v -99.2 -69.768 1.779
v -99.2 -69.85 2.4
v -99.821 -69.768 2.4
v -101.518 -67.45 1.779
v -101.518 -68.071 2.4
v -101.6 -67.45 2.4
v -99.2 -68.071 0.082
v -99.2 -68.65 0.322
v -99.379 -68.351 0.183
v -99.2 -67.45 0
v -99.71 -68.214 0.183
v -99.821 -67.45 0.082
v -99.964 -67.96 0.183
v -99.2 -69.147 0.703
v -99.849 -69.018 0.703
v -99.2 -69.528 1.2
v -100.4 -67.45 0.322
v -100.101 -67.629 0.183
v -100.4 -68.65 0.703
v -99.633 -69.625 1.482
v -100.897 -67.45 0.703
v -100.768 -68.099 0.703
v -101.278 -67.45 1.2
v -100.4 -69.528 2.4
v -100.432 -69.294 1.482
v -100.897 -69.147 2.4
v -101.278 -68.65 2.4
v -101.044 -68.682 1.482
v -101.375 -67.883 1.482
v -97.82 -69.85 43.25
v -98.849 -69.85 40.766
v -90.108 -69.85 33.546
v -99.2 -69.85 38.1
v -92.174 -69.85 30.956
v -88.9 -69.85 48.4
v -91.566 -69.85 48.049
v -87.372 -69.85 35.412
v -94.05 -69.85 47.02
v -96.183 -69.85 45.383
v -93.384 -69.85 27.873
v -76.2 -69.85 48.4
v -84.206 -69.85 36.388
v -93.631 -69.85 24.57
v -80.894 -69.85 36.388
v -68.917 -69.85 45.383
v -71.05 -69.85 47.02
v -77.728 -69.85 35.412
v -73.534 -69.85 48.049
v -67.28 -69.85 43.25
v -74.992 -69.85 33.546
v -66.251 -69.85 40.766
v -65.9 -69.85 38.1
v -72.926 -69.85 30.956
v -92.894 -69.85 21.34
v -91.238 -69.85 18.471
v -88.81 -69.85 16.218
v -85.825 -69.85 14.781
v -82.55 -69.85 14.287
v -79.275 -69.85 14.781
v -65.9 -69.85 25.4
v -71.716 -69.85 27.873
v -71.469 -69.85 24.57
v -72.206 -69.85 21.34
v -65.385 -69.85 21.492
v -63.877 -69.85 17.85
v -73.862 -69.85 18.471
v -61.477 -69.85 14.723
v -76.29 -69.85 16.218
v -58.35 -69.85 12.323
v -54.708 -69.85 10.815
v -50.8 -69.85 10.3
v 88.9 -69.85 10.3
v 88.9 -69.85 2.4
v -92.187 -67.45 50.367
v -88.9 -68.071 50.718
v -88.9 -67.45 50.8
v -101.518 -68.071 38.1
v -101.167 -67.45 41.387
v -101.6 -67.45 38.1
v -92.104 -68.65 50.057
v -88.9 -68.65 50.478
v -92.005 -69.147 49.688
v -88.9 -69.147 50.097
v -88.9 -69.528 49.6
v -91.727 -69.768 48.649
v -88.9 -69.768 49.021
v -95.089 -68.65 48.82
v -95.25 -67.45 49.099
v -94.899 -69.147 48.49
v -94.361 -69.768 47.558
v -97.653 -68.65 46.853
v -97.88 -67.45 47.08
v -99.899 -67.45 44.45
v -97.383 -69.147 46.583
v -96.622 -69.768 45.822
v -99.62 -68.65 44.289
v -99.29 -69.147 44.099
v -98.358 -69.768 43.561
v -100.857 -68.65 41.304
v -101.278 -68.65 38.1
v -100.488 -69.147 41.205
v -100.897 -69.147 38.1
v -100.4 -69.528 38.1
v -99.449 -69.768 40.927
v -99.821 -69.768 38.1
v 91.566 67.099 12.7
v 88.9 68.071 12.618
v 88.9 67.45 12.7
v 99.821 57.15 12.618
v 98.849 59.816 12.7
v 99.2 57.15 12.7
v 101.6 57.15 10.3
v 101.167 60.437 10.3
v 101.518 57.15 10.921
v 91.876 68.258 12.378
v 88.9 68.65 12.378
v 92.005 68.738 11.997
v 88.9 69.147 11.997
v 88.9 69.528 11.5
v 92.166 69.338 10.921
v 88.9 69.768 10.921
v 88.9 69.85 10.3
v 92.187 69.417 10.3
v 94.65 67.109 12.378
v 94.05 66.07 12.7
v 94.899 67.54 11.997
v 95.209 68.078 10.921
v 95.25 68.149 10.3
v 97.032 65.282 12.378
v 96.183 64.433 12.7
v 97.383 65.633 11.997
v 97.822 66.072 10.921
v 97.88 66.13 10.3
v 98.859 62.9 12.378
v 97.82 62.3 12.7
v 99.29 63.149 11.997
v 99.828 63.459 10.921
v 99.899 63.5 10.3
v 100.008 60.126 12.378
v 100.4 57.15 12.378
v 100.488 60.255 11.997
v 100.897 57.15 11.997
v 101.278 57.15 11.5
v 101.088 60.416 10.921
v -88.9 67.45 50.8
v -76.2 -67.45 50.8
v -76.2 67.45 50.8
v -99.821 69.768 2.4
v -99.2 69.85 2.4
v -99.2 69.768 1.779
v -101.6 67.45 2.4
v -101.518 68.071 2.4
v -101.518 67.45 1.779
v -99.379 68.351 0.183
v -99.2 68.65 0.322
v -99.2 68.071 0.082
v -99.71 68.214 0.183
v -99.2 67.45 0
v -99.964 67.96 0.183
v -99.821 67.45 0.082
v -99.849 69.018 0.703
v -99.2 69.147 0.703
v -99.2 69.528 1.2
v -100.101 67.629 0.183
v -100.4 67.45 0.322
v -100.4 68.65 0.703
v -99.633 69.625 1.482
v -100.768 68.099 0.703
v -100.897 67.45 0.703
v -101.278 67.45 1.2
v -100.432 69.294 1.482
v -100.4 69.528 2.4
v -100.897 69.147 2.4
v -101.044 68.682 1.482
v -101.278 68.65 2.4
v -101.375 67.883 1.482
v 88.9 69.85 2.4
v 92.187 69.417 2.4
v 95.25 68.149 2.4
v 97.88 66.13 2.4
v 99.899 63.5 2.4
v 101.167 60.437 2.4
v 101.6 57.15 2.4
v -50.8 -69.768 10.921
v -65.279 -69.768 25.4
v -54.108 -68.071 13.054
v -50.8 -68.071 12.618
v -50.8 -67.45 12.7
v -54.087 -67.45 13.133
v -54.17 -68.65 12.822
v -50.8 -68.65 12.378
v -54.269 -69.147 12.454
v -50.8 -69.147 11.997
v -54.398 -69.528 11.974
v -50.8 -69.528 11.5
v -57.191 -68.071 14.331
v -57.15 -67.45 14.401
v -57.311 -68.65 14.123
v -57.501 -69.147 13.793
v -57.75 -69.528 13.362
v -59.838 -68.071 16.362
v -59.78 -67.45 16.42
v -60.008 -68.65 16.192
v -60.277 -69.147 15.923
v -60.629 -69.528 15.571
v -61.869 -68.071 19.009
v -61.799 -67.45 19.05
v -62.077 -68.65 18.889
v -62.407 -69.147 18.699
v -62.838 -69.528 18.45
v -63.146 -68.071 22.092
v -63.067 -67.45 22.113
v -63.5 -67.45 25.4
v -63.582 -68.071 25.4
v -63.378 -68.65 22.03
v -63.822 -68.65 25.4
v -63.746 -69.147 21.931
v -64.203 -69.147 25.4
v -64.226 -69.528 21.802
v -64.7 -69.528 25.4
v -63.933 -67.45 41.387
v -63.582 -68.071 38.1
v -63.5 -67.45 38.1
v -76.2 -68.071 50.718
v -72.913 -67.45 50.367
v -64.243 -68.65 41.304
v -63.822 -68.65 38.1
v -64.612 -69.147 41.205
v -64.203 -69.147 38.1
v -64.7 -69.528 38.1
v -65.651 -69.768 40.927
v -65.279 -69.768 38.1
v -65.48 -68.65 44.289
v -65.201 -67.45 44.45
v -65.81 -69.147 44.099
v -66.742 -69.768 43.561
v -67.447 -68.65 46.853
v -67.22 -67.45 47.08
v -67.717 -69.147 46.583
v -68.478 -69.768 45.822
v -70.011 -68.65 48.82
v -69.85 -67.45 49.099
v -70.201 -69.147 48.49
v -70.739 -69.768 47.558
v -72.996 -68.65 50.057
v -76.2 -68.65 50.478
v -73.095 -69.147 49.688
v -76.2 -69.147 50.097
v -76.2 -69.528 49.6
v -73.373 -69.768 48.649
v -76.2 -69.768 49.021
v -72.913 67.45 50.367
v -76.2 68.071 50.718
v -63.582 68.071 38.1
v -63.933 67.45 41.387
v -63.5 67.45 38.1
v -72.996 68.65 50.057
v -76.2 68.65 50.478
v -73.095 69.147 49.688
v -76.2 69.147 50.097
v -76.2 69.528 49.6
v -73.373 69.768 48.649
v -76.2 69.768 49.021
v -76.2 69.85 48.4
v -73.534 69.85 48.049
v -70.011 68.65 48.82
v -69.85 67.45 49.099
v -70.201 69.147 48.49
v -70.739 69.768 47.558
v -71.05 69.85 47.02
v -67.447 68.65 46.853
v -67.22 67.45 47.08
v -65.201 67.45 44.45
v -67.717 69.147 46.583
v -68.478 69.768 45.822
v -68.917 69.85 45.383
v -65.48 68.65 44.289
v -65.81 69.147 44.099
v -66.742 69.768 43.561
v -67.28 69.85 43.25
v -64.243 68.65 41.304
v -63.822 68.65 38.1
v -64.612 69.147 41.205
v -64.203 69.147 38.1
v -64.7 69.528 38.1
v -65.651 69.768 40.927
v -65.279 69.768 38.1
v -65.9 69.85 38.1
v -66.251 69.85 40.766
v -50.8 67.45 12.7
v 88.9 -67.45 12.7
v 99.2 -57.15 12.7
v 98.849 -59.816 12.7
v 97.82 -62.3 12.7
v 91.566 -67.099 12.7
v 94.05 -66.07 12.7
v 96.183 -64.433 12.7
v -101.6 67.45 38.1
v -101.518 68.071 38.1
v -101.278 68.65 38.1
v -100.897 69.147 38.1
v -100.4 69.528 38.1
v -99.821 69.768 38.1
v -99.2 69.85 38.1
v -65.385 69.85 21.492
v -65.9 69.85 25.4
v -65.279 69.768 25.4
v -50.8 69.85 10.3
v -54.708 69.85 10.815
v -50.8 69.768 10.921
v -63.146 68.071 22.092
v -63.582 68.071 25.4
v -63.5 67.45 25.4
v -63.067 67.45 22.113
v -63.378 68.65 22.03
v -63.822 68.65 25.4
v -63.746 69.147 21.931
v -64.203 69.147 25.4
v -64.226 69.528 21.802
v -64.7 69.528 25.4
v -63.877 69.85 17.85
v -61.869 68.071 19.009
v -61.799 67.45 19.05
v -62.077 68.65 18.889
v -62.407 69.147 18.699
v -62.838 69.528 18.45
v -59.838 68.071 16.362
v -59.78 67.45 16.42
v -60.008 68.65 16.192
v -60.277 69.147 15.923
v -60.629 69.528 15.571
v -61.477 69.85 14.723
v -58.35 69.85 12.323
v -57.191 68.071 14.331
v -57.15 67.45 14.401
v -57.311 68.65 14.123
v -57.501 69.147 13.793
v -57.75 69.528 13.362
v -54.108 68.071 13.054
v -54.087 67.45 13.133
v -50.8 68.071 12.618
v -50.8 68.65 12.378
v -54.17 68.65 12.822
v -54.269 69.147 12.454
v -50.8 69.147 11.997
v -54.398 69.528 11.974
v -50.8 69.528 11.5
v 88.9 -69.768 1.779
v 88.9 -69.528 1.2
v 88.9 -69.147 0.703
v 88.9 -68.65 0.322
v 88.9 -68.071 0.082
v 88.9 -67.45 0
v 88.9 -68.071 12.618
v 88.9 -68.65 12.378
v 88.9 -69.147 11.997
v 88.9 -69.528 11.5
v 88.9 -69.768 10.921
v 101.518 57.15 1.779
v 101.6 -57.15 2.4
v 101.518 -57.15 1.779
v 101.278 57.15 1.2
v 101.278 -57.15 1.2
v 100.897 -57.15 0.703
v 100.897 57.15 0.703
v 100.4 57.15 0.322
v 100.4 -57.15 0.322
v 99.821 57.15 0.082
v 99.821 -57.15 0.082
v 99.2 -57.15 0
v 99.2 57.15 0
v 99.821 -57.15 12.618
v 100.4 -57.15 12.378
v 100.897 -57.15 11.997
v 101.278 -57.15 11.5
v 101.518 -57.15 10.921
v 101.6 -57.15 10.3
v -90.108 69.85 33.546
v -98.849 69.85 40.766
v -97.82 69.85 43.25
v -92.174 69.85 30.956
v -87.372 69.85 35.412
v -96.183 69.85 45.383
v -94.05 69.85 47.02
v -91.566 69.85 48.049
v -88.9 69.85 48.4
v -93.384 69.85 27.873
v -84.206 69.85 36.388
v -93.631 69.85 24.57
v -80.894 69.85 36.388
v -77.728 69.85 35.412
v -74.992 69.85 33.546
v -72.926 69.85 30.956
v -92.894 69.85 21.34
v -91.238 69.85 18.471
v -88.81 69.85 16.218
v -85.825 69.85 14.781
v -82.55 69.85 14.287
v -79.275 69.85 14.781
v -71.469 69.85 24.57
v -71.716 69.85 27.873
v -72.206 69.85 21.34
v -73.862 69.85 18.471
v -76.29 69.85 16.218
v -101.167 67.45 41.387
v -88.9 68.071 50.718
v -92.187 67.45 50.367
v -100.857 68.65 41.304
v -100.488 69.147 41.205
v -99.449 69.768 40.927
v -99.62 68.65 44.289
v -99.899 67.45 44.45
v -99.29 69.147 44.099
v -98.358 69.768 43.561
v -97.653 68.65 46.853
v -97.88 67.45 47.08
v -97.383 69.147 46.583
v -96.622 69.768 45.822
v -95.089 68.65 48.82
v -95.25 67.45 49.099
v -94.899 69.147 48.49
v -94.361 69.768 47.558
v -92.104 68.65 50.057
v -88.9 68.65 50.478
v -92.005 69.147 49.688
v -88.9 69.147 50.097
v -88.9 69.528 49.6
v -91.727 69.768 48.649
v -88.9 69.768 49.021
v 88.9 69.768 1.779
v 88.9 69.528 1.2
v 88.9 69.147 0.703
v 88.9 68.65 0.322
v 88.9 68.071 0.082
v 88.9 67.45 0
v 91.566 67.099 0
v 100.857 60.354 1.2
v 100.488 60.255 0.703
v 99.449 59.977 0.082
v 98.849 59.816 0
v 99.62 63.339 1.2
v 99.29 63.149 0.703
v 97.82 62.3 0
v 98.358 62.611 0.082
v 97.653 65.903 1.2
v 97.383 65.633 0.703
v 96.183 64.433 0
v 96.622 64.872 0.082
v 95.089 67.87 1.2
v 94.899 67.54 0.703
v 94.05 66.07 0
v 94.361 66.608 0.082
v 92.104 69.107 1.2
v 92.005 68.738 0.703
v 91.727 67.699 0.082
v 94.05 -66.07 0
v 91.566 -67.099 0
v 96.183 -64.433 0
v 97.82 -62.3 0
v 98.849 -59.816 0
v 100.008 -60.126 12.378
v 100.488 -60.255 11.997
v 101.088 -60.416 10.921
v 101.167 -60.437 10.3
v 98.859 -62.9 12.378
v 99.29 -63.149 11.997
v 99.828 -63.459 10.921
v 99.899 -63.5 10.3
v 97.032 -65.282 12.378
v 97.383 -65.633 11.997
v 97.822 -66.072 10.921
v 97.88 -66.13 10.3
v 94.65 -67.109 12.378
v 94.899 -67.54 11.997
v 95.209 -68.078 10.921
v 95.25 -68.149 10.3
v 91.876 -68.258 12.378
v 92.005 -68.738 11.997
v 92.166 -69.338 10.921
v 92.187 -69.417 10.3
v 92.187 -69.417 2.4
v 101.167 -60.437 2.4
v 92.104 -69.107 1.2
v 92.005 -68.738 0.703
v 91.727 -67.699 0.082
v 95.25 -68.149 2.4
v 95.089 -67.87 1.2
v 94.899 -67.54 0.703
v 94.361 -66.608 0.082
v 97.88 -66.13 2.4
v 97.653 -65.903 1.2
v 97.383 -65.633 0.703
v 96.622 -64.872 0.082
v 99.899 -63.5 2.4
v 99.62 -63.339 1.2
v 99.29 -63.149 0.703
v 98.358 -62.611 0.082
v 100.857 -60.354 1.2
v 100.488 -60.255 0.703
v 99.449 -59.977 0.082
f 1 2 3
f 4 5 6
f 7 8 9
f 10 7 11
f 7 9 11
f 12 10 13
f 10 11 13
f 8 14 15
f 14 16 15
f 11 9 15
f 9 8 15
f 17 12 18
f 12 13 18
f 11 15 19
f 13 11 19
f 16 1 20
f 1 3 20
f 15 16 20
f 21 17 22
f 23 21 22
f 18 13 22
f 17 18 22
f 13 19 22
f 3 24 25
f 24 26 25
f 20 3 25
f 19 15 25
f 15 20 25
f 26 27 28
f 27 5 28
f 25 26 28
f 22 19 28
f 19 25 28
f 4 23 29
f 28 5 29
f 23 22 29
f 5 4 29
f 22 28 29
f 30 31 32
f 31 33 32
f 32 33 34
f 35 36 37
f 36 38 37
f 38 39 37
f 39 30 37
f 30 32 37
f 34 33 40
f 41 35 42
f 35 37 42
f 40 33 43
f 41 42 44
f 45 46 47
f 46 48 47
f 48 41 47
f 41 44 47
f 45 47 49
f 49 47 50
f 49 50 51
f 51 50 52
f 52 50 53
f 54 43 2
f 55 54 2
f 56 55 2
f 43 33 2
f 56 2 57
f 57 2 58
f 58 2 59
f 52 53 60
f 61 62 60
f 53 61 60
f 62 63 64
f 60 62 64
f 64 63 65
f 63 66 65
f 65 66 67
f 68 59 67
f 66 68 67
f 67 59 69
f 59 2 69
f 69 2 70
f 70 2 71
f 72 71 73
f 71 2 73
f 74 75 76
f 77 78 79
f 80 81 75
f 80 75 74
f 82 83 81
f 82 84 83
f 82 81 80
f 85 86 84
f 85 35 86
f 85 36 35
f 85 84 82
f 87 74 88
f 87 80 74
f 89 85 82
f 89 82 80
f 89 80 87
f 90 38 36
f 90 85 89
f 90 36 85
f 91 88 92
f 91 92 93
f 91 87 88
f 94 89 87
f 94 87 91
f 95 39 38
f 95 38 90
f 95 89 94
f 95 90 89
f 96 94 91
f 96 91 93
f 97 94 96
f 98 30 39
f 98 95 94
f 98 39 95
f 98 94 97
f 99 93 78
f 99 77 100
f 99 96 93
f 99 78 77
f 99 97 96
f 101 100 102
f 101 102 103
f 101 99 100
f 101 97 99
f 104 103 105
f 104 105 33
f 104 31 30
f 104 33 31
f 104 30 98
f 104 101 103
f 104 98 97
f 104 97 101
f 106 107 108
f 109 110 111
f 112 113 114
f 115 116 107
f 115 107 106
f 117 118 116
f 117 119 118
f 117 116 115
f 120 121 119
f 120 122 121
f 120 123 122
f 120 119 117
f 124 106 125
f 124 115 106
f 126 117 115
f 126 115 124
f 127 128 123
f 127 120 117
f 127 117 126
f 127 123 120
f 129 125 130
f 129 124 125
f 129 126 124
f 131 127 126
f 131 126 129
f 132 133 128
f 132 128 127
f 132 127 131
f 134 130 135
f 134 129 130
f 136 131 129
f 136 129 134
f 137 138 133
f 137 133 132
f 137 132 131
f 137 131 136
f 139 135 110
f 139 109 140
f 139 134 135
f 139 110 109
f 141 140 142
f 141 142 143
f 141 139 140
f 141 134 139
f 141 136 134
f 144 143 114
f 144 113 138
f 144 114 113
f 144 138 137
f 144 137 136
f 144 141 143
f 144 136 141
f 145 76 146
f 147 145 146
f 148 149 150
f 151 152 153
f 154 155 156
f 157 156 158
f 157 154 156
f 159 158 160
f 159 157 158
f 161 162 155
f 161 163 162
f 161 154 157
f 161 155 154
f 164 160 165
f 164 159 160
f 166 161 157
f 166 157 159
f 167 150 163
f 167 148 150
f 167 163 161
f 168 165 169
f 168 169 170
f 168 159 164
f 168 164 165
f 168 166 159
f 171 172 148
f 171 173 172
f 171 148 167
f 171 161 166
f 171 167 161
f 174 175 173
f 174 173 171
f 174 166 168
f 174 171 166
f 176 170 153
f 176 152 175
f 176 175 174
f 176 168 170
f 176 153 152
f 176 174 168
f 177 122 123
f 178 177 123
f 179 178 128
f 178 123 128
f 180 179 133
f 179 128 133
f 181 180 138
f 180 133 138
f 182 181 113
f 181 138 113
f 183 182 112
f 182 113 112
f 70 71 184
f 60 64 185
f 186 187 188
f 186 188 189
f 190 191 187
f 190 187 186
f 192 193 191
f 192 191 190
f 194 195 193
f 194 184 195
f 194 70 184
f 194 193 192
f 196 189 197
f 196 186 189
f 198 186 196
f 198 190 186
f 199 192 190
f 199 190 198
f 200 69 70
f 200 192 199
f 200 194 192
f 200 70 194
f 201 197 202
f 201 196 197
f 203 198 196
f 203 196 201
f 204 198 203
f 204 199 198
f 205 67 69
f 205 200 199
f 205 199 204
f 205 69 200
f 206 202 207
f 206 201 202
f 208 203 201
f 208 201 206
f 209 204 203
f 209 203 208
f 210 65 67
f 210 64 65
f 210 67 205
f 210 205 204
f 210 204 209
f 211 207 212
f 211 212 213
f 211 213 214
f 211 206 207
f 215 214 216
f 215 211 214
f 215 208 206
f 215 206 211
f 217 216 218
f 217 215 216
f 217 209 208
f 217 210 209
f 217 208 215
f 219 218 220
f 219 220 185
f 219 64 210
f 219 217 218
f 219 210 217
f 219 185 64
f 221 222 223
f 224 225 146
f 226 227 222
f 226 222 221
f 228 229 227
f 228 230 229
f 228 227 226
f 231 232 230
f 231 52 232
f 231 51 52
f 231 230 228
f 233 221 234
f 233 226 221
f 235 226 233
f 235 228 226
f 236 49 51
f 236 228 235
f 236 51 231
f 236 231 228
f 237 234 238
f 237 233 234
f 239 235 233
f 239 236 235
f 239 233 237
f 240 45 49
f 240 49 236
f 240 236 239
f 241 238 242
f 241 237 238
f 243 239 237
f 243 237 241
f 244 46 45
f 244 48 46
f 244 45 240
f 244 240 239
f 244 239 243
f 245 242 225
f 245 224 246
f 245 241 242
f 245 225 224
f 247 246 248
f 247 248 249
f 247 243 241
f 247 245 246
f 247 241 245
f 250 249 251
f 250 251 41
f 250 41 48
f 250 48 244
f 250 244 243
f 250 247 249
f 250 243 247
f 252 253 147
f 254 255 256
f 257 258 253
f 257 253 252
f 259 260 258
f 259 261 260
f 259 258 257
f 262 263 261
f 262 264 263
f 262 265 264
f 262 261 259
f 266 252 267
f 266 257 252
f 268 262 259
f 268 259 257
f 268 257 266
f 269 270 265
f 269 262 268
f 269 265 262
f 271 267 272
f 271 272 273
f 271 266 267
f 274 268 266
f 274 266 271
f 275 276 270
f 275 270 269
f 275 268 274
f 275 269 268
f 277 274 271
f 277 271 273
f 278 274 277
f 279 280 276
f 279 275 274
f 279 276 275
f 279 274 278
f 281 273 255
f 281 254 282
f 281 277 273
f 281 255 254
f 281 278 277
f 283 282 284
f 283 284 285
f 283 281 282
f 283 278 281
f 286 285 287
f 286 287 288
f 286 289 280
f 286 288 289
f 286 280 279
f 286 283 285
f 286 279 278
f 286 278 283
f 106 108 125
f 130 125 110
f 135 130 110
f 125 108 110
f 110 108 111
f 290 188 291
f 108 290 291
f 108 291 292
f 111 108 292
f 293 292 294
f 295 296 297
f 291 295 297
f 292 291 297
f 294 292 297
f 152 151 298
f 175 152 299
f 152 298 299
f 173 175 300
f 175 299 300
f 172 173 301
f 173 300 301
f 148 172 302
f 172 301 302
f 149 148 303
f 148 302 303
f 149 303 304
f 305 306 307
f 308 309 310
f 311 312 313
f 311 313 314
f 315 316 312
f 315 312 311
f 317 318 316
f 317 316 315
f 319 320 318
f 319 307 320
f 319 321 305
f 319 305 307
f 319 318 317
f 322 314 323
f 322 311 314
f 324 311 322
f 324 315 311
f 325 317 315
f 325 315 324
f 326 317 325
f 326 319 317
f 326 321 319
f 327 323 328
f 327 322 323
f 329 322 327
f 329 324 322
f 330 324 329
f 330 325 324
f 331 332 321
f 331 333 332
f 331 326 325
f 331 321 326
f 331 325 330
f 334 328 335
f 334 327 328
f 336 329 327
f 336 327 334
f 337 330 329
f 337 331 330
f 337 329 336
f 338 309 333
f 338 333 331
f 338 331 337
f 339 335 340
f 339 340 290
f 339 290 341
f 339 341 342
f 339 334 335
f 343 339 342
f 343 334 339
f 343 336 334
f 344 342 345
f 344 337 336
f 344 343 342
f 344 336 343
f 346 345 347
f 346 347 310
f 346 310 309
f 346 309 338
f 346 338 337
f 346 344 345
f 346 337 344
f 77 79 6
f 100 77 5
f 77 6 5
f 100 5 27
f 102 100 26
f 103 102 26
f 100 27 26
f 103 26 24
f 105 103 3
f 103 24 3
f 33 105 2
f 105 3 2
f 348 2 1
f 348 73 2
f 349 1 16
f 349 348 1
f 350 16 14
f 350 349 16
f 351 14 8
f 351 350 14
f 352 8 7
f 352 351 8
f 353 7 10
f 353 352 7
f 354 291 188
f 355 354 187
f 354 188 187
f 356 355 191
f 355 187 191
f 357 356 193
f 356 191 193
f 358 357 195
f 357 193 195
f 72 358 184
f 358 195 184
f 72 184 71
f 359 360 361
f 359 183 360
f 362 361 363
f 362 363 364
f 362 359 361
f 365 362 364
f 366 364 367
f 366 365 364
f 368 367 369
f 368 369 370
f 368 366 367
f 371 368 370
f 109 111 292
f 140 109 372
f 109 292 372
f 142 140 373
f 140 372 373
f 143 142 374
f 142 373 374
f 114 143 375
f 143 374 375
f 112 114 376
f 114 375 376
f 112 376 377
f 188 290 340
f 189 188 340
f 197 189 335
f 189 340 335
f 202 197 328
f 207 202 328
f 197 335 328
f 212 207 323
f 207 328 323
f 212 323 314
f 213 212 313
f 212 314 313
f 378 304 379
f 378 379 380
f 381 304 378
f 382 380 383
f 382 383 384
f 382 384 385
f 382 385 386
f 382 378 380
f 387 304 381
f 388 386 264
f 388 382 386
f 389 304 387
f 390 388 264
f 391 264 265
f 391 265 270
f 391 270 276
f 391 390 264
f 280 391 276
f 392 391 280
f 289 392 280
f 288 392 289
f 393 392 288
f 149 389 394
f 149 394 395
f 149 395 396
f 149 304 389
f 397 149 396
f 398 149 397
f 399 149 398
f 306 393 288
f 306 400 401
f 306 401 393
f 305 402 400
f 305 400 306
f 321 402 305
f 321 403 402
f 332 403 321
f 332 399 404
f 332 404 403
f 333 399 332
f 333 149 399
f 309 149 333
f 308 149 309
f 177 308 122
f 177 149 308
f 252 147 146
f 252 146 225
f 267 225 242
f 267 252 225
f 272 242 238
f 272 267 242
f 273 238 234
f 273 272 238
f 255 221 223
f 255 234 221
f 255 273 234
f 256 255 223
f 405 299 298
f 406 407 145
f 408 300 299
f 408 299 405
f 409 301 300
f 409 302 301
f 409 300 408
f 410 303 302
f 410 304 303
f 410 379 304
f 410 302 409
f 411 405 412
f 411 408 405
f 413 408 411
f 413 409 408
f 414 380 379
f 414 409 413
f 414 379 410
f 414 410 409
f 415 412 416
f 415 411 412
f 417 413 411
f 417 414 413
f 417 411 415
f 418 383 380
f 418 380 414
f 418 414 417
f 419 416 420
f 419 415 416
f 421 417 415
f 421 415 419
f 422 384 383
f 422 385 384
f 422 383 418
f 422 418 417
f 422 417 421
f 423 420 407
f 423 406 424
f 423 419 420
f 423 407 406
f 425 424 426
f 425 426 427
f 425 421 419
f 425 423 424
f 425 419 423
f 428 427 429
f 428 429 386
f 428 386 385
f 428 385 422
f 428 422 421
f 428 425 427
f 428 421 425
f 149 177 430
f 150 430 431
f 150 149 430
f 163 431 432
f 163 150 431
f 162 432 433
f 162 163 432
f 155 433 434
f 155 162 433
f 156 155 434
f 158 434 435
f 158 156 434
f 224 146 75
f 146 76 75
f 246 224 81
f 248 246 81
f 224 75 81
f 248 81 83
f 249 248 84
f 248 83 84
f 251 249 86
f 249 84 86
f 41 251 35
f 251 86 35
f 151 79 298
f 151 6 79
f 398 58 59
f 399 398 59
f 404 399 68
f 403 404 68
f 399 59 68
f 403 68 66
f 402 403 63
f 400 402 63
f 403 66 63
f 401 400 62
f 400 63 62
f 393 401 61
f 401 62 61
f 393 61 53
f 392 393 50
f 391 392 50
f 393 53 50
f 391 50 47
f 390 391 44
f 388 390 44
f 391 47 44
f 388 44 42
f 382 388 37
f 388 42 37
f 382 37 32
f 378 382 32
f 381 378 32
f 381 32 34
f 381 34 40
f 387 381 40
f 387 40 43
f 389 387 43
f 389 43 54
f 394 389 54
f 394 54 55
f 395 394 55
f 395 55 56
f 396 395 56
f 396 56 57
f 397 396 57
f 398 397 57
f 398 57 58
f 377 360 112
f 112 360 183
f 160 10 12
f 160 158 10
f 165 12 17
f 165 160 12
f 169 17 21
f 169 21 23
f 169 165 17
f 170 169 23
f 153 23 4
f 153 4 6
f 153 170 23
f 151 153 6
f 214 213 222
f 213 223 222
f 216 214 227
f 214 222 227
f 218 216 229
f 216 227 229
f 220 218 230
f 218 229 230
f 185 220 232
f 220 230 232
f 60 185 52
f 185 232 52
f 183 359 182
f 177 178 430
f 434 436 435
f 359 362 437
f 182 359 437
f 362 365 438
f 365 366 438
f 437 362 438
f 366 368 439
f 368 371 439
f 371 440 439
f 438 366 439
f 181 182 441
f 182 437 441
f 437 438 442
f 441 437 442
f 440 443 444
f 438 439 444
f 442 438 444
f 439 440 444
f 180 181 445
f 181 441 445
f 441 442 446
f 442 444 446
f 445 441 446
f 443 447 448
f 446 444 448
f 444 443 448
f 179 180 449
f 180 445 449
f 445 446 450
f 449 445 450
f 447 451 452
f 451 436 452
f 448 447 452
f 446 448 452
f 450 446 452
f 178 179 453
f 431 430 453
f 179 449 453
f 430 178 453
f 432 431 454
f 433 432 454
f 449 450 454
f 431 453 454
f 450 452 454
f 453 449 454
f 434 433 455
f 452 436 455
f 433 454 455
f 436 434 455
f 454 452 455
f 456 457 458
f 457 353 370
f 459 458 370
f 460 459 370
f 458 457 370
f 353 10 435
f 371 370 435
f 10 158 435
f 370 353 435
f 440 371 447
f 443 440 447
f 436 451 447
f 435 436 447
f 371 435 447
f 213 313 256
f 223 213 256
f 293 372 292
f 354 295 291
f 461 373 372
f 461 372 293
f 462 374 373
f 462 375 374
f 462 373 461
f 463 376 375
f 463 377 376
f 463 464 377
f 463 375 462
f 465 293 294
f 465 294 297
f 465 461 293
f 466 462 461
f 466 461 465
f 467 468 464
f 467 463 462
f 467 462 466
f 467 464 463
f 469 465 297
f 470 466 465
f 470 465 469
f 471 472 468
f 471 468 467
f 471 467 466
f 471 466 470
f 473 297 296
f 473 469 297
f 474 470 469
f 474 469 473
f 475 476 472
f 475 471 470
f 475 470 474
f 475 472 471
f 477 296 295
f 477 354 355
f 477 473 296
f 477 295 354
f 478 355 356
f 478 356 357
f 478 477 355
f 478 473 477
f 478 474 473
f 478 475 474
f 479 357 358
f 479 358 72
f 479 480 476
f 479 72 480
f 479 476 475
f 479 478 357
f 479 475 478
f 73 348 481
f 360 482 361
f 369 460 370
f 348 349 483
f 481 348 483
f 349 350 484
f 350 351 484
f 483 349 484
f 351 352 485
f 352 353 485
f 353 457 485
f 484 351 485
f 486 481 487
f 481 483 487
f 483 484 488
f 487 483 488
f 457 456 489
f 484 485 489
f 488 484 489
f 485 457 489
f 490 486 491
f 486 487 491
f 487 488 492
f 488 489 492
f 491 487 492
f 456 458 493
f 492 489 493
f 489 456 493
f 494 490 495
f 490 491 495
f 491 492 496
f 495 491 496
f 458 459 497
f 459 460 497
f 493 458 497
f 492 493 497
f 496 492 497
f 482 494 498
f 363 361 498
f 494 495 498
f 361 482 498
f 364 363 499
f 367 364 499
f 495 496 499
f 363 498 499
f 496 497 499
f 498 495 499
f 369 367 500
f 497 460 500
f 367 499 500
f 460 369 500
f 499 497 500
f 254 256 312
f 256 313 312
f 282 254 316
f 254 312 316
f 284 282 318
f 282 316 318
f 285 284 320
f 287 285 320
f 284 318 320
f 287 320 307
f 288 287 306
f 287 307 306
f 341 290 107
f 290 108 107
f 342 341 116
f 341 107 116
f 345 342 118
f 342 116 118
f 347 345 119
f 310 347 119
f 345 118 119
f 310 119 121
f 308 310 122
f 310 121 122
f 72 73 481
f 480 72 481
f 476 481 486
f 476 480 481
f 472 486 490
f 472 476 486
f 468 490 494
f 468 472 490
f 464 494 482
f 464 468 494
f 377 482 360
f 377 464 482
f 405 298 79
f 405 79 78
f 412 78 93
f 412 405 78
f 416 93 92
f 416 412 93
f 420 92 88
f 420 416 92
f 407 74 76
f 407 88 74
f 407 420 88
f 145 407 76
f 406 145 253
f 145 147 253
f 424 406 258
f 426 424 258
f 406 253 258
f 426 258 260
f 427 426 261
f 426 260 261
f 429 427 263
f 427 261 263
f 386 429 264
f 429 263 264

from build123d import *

# Parameters (mm, degrees)
CROQUIS1_W              = 203.2
CROQUIS1_H              = 139.7
SALIENTE_EXTRUIR1_DEPTH = 50.8
CROQUIS2_W              = 165.1
CROQUIS2_H              = 38.1
CORTAR_EXTRUIR1_DEPTH   = 181.05357536
CROQUIS3_R              = 11.1125
CORTAR_EXTRUIR2_DEPTH   = 181.05357536
REDONDEO1_R             = 12.7
REDONDEO2_R             = 12.7
REDONDEO3_R             = 2.4


with BuildPart() as part:
    # Croquis1 → Saliente-Extruir1 (new body)
    with BuildSketch(Plane.XY):
        Rectangle(CROQUIS1_W, CROQUIS1_H)
    extrude(amount=SALIENTE_EXTRUIR1_DEPTH)

    # Croquis2 → Cortar-Extruir1 (cut, through all)
    with BuildSketch(Plane.XZ.offset(69.85)):
        with Locations((19.05, 31.75)):
            Rectangle(CROQUIS2_W, CROQUIS2_H)
    extrude(amount=-CORTAR_EXTRUIR1_DEPTH, mode=Mode.SUBTRACT)

    # Croquis3 → Cortar-Extruir2 (cut, through all)
    with BuildSketch(Plane.XZ.offset(69.85)):
        with Locations(Location((-82.55, 25.4, 0), (0, 0, 270))):
            Circle(CROQUIS3_R)
    extrude(amount=-CORTAR_EXTRUIR2_DEPTH, mode=Mode.SUBTRACT)

    # Redondeo1
    redondeo1_edges = [part.edges().sort_by_distance(p)[0] for p in [
        (-101.6, 0, 50.8),
        (-63.5, 0, 12.7),
        (-63.5, 0, 50.8),
    ]]
    fillet(redondeo1_edges, radius=REDONDEO1_R)

    # Redondeo2
    redondeo2_edges = [part.edges().sort_by_distance(p)[0] for p in [
        (101.6, -69.85, 6.35),
        (101.6, 69.85, 6.35),
    ]]
    fillet(redondeo2_edges, radius=REDONDEO2_R)

    # Redondeo3
    redondeo3_edges = [part.edges().sort_by_distance(p)[0] for p in [
        (-82.55, 69.85, 50.8),
        (-82.55, -69.85, 50.8),
        (19.05, -69.85, 12.7),
        (-63.5, -69.85, 31.75),
        (-101.6, -69.85, 19.05),
        (-67.219743879, -69.85, 47.080256121),
        (-97.880256121, -69.85, 47.080256121),
        (-101.6, 69.85, 19.05),
        (-63.5, 69.85, 31.75),
        (19.05, 69.85, 12.7),
        (-67.219743879, 69.85, 47.080256121),
        (-97.880256121, 69.85, 47.080256121),
        (-59.780256121, -69.85, 16.419743879),
        (-59.780256121, 69.85, 16.419743879),
        (-6.35, -69.85, 0),
        (-6.35, 69.85, 0),
        (101.6, 0, 0),
        (-101.6, 0, 0),
        (97.880256121, -66.130256121, 0),
        (97.880256121, 66.130256121, 0),
        (101.6, 0, 12.7),
        (97.880256121, -66.130256121, 12.7),
        (97.880256121, 66.130256121, 12.7),
    ]]
    fillet(redondeo3_edges, radius=REDONDEO3_R)


solid = part.part
